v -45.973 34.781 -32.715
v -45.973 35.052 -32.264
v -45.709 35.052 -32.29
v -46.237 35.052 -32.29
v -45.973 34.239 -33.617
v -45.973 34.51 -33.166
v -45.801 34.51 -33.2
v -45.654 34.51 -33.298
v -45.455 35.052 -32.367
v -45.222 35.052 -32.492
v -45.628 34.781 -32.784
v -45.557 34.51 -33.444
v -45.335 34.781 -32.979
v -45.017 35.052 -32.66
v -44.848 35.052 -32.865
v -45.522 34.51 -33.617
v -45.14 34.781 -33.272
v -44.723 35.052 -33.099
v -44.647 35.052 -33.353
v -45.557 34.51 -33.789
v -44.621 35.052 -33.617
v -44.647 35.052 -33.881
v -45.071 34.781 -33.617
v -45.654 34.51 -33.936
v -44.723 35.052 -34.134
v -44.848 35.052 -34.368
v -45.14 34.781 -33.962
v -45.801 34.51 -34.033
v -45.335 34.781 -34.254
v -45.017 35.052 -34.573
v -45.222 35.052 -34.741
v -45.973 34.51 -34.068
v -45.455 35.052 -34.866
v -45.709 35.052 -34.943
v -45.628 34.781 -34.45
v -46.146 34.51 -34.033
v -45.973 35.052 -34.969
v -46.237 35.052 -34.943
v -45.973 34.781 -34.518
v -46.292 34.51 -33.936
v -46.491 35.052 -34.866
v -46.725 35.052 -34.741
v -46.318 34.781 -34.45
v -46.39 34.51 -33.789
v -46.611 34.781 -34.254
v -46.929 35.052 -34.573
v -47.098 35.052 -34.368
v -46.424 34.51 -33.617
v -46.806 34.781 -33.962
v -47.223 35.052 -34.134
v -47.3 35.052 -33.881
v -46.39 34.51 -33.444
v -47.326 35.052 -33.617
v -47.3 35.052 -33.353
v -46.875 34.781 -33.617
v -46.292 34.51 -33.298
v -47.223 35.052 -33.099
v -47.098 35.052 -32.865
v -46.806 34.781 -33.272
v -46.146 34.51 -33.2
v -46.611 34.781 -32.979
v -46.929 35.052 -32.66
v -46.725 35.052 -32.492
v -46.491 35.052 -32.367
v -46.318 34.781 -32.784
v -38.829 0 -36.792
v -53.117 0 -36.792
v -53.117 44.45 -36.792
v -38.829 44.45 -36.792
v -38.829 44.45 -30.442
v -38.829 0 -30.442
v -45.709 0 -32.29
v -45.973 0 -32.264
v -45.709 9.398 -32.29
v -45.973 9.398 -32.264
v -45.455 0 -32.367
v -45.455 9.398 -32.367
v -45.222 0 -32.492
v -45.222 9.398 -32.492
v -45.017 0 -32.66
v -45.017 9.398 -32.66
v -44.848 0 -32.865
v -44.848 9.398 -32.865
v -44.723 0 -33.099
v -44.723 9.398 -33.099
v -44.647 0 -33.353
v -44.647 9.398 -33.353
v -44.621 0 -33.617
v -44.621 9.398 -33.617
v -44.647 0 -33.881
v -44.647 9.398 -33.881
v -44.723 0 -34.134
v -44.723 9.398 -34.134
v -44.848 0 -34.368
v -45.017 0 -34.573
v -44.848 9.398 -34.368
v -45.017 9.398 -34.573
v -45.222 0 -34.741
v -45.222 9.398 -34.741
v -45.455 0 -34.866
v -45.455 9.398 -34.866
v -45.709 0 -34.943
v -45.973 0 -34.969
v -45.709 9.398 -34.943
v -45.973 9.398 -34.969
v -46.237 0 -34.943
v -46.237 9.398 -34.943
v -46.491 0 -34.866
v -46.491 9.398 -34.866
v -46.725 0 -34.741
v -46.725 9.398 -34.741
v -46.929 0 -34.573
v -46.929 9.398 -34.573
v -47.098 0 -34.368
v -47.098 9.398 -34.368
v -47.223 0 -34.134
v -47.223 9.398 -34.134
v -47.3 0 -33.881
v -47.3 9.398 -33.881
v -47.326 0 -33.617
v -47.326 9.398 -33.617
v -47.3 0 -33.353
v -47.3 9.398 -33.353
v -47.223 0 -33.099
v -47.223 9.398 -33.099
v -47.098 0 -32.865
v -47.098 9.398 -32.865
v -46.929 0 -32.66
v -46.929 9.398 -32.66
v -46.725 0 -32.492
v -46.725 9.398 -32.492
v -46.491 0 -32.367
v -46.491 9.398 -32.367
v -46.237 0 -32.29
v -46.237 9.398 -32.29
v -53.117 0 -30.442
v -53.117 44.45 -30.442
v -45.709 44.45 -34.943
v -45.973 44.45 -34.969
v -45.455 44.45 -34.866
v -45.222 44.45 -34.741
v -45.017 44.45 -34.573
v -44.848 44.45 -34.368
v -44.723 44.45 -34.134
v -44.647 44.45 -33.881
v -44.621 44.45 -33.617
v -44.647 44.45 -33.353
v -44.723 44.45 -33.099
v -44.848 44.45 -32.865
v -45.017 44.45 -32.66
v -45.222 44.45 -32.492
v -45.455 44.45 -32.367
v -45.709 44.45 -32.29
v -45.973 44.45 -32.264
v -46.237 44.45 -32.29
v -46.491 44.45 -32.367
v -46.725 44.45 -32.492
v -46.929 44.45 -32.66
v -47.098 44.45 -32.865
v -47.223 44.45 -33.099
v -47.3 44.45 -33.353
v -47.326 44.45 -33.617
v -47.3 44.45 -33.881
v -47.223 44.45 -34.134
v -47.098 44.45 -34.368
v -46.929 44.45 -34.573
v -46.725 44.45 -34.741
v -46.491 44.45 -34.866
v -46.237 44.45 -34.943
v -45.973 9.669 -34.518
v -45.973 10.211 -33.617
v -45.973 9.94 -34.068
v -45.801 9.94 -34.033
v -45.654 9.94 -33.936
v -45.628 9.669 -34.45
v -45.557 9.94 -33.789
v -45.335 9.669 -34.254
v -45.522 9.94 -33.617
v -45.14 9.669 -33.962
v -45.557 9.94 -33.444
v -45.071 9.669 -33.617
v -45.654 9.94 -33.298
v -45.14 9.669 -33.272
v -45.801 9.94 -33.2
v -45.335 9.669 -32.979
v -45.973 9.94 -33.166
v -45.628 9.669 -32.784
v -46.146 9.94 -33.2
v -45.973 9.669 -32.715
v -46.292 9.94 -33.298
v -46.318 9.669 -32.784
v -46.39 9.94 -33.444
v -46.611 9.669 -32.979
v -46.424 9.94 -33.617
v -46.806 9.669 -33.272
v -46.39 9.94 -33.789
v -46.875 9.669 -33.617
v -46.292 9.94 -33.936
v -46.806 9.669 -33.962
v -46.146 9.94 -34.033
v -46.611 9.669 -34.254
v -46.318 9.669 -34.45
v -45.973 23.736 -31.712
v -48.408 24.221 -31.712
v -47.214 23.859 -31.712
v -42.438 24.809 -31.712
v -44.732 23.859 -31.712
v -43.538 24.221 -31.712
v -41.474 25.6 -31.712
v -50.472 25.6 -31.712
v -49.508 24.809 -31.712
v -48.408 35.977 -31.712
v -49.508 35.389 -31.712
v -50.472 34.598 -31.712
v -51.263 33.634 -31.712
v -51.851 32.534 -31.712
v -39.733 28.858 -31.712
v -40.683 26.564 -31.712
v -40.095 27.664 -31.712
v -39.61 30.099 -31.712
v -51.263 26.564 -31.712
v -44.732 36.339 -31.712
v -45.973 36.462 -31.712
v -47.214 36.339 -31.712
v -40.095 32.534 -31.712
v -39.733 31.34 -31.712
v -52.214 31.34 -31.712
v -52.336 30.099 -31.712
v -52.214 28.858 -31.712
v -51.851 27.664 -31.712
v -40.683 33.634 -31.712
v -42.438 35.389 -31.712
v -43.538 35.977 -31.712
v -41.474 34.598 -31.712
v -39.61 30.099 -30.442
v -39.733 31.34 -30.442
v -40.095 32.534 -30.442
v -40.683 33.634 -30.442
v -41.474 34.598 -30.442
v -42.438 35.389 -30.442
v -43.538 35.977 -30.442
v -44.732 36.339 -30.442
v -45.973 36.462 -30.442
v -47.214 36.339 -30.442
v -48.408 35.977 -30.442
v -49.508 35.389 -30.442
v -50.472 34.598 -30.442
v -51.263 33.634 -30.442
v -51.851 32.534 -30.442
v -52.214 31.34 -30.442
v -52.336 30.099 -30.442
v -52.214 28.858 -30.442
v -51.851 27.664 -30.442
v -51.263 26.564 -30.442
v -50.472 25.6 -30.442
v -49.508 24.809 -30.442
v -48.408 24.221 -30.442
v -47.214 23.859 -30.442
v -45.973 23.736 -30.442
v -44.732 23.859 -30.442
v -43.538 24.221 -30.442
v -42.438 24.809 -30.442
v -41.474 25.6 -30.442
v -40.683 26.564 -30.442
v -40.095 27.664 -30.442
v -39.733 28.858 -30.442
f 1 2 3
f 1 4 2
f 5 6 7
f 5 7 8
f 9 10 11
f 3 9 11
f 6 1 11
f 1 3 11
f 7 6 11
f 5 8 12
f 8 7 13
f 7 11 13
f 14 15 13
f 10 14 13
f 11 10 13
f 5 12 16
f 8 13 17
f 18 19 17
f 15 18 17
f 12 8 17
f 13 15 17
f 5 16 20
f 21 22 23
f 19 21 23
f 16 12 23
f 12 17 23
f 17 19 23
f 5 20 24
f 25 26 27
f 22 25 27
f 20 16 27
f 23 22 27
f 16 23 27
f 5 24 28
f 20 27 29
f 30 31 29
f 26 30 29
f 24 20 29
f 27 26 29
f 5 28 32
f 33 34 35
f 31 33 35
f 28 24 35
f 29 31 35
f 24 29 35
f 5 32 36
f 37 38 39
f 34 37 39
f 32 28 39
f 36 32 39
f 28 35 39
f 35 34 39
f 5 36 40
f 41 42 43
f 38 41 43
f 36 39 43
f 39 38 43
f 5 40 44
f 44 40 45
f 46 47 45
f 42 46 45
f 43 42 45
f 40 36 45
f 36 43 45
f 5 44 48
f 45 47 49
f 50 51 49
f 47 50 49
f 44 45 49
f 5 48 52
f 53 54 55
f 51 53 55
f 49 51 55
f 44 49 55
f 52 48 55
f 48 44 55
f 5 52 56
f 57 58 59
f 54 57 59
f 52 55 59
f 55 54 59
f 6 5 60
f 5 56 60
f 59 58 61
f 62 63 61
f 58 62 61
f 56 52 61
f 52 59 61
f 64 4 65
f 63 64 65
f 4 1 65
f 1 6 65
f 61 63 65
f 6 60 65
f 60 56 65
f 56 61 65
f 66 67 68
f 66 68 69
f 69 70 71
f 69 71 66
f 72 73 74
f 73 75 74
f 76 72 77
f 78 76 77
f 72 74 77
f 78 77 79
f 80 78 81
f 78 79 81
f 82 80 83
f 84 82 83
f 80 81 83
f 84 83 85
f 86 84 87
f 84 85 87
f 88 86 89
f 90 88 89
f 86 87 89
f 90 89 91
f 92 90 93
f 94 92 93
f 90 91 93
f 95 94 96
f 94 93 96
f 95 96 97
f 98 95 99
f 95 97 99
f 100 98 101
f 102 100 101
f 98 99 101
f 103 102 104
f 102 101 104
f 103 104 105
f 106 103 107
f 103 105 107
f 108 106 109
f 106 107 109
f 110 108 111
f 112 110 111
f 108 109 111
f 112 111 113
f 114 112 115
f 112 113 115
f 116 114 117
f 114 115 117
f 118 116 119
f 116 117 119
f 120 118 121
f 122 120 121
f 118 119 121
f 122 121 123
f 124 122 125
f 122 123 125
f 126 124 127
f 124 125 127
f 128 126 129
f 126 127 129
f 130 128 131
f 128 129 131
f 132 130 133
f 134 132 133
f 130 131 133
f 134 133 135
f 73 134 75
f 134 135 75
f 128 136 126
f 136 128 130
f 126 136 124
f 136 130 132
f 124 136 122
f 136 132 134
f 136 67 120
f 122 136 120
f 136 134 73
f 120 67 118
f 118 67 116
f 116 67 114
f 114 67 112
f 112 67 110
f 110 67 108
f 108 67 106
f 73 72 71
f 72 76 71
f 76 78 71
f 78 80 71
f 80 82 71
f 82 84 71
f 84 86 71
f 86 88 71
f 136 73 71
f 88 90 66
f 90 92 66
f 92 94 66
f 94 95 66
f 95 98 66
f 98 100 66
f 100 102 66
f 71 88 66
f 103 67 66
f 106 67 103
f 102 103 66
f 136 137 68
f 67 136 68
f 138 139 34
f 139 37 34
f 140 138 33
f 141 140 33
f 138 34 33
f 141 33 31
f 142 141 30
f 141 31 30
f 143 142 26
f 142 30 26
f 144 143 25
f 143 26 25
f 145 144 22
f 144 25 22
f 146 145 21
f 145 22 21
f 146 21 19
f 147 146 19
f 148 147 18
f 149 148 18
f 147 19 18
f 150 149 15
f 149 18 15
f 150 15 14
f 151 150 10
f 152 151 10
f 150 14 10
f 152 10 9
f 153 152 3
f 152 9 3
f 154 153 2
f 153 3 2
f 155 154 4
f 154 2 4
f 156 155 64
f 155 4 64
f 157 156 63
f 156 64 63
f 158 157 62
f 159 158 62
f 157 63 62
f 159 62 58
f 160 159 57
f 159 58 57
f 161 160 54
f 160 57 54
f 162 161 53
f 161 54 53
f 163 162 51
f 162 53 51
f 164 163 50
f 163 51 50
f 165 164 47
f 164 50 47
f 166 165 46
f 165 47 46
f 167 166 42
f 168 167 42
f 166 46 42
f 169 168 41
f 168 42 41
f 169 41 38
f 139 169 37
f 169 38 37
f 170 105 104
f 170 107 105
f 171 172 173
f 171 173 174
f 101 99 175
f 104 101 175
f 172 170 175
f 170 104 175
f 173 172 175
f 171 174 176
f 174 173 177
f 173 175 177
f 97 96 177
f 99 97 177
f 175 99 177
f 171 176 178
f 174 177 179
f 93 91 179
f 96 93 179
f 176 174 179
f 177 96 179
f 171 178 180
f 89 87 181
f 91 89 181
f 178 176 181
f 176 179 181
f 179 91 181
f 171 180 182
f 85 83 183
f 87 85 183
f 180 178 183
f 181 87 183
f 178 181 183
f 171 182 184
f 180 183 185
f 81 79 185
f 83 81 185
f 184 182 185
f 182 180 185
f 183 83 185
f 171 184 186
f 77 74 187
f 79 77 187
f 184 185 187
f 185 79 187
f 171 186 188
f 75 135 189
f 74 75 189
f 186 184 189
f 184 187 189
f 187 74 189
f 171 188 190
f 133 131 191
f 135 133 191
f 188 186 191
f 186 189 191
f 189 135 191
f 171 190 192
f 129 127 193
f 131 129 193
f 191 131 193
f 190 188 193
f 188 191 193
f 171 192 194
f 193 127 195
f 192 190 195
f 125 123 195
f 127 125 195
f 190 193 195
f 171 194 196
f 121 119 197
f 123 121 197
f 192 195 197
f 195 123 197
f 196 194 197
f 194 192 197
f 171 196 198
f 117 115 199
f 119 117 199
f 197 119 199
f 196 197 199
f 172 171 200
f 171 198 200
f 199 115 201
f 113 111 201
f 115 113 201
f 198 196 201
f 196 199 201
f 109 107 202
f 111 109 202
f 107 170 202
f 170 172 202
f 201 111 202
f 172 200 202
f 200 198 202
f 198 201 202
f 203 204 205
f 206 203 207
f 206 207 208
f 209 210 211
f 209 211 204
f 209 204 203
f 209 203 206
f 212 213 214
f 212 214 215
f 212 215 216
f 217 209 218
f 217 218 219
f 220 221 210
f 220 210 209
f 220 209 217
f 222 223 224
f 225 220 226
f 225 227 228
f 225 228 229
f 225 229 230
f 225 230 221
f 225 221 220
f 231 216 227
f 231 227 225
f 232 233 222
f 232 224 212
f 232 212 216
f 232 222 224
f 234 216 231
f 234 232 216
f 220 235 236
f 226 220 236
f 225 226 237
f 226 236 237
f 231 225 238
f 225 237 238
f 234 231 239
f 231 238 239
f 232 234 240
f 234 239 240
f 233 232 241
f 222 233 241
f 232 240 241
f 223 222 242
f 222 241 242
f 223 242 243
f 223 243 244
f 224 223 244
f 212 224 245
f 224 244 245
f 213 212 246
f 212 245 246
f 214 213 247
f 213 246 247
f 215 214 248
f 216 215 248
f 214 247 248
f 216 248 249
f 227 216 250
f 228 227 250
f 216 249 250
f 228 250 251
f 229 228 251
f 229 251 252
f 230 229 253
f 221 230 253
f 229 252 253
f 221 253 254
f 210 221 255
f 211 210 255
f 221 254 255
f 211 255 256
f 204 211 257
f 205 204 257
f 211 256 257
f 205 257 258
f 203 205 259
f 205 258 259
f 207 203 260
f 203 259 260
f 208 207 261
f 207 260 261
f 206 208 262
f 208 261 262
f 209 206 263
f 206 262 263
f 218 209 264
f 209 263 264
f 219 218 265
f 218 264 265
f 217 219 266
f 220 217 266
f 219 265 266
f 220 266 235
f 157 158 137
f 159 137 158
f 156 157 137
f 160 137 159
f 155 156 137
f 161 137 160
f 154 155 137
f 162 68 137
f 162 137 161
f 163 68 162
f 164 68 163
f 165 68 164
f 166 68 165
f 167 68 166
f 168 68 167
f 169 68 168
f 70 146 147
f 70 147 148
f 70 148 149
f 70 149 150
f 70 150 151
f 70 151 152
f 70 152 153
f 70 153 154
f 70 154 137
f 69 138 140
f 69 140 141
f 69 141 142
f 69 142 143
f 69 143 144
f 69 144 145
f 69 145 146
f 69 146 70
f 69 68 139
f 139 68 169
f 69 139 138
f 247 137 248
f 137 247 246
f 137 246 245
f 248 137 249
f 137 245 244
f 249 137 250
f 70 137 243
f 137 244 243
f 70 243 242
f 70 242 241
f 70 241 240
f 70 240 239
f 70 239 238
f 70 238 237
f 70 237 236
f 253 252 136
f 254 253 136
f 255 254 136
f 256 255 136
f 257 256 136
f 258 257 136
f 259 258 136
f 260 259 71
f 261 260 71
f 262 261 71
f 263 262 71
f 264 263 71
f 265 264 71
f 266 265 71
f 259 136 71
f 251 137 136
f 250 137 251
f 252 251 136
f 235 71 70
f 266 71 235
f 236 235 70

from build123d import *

# Parameters (mm, degrees)
SKETCH1_W                           = 14.2875
SKETCH1_H                           = 6.35
EXTRUDE1_DEPTH                      = 44.45
SKETCH6_R                           = 6.3627
CUT_EXTRUDE2_DEPTH                  = 1.27
F_6_32_TAPPED_HOLE1_D               = 2.7051
F_6_32_TAPPED_HOLE1_DEPTH           = 9.398
F_6_32_TAPPED_HOLE1_TIP             = 0.81269403
F_6_32_TAPPED_HOLE1_ON_FACE_2_D     = 2.7051
F_6_32_TAPPED_HOLE1_ON_FACE_2_DEPTH = 9.398
F_6_32_TAPPED_HOLE1_ON_FACE_2_TIP   = 0.81269403


with BuildPart() as part:
    # Sketch1 → Extrude1 (new body)
    with BuildSketch(Plane(origin=(0, 0, 0), x_dir=(1, 0, 0), z_dir=(0, 1, 0))):
        with Locations((-45.973078165, 33.616731266)):
            Rectangle(SKETCH1_W, SKETCH1_H)
    extrude(amount=EXTRUDE1_DEPTH)

    # Sketch6 → Cut-Extrude2 (cut)
    with BuildSketch(Plane.XY.offset(-30.441731266)):
        with Locations((-45.973078165, 30.099)):
            Circle(SKETCH6_R)
    extrude(amount=-CUT_EXTRUDE2_DEPTH, mode=Mode.SUBTRACT)

    # #6-32 Tapped Hole1
    with Locations(Plane(origin=(-45.973078165, 44.45, -33.616731266), x_dir=(0, 0, 1), z_dir=(0, 1, 0))):
        with Locations((0, 0)):
            Hole(F_6_32_TAPPED_HOLE1_D / 2, depth=F_6_32_TAPPED_HOLE1_DEPTH)
            with Locations((0, 0, -(F_6_32_TAPPED_HOLE1_DEPTH + F_6_32_TAPPED_HOLE1_TIP / 2))):  # 118° drill point
                Cone(0, F_6_32_TAPPED_HOLE1_D / 2, F_6_32_TAPPED_HOLE1_TIP, mode=Mode.SUBTRACT)

    # #6-32 Tapped Hole1 on face 2
    with Locations(Plane(origin=(-45.973078165, 0, -33.616731266), x_dir=(0, 0, -1), z_dir=(0, -1, 0))):
        with Locations((0, 0)):
            Hole(F_6_32_TAPPED_HOLE1_ON_FACE_2_D / 2, depth=F_6_32_TAPPED_HOLE1_ON_FACE_2_DEPTH)
            with Locations((0, 0, -(F_6_32_TAPPED_HOLE1_ON_FACE_2_DEPTH + F_6_32_TAPPED_HOLE1_ON_FACE_2_TIP / 2))):  # 118° drill point
                Cone(0, F_6_32_TAPPED_HOLE1_ON_FACE_2_D / 2, F_6_32_TAPPED_HOLE1_ON_FACE_2_TIP, mode=Mode.SUBTRACT)


solid = part.part
